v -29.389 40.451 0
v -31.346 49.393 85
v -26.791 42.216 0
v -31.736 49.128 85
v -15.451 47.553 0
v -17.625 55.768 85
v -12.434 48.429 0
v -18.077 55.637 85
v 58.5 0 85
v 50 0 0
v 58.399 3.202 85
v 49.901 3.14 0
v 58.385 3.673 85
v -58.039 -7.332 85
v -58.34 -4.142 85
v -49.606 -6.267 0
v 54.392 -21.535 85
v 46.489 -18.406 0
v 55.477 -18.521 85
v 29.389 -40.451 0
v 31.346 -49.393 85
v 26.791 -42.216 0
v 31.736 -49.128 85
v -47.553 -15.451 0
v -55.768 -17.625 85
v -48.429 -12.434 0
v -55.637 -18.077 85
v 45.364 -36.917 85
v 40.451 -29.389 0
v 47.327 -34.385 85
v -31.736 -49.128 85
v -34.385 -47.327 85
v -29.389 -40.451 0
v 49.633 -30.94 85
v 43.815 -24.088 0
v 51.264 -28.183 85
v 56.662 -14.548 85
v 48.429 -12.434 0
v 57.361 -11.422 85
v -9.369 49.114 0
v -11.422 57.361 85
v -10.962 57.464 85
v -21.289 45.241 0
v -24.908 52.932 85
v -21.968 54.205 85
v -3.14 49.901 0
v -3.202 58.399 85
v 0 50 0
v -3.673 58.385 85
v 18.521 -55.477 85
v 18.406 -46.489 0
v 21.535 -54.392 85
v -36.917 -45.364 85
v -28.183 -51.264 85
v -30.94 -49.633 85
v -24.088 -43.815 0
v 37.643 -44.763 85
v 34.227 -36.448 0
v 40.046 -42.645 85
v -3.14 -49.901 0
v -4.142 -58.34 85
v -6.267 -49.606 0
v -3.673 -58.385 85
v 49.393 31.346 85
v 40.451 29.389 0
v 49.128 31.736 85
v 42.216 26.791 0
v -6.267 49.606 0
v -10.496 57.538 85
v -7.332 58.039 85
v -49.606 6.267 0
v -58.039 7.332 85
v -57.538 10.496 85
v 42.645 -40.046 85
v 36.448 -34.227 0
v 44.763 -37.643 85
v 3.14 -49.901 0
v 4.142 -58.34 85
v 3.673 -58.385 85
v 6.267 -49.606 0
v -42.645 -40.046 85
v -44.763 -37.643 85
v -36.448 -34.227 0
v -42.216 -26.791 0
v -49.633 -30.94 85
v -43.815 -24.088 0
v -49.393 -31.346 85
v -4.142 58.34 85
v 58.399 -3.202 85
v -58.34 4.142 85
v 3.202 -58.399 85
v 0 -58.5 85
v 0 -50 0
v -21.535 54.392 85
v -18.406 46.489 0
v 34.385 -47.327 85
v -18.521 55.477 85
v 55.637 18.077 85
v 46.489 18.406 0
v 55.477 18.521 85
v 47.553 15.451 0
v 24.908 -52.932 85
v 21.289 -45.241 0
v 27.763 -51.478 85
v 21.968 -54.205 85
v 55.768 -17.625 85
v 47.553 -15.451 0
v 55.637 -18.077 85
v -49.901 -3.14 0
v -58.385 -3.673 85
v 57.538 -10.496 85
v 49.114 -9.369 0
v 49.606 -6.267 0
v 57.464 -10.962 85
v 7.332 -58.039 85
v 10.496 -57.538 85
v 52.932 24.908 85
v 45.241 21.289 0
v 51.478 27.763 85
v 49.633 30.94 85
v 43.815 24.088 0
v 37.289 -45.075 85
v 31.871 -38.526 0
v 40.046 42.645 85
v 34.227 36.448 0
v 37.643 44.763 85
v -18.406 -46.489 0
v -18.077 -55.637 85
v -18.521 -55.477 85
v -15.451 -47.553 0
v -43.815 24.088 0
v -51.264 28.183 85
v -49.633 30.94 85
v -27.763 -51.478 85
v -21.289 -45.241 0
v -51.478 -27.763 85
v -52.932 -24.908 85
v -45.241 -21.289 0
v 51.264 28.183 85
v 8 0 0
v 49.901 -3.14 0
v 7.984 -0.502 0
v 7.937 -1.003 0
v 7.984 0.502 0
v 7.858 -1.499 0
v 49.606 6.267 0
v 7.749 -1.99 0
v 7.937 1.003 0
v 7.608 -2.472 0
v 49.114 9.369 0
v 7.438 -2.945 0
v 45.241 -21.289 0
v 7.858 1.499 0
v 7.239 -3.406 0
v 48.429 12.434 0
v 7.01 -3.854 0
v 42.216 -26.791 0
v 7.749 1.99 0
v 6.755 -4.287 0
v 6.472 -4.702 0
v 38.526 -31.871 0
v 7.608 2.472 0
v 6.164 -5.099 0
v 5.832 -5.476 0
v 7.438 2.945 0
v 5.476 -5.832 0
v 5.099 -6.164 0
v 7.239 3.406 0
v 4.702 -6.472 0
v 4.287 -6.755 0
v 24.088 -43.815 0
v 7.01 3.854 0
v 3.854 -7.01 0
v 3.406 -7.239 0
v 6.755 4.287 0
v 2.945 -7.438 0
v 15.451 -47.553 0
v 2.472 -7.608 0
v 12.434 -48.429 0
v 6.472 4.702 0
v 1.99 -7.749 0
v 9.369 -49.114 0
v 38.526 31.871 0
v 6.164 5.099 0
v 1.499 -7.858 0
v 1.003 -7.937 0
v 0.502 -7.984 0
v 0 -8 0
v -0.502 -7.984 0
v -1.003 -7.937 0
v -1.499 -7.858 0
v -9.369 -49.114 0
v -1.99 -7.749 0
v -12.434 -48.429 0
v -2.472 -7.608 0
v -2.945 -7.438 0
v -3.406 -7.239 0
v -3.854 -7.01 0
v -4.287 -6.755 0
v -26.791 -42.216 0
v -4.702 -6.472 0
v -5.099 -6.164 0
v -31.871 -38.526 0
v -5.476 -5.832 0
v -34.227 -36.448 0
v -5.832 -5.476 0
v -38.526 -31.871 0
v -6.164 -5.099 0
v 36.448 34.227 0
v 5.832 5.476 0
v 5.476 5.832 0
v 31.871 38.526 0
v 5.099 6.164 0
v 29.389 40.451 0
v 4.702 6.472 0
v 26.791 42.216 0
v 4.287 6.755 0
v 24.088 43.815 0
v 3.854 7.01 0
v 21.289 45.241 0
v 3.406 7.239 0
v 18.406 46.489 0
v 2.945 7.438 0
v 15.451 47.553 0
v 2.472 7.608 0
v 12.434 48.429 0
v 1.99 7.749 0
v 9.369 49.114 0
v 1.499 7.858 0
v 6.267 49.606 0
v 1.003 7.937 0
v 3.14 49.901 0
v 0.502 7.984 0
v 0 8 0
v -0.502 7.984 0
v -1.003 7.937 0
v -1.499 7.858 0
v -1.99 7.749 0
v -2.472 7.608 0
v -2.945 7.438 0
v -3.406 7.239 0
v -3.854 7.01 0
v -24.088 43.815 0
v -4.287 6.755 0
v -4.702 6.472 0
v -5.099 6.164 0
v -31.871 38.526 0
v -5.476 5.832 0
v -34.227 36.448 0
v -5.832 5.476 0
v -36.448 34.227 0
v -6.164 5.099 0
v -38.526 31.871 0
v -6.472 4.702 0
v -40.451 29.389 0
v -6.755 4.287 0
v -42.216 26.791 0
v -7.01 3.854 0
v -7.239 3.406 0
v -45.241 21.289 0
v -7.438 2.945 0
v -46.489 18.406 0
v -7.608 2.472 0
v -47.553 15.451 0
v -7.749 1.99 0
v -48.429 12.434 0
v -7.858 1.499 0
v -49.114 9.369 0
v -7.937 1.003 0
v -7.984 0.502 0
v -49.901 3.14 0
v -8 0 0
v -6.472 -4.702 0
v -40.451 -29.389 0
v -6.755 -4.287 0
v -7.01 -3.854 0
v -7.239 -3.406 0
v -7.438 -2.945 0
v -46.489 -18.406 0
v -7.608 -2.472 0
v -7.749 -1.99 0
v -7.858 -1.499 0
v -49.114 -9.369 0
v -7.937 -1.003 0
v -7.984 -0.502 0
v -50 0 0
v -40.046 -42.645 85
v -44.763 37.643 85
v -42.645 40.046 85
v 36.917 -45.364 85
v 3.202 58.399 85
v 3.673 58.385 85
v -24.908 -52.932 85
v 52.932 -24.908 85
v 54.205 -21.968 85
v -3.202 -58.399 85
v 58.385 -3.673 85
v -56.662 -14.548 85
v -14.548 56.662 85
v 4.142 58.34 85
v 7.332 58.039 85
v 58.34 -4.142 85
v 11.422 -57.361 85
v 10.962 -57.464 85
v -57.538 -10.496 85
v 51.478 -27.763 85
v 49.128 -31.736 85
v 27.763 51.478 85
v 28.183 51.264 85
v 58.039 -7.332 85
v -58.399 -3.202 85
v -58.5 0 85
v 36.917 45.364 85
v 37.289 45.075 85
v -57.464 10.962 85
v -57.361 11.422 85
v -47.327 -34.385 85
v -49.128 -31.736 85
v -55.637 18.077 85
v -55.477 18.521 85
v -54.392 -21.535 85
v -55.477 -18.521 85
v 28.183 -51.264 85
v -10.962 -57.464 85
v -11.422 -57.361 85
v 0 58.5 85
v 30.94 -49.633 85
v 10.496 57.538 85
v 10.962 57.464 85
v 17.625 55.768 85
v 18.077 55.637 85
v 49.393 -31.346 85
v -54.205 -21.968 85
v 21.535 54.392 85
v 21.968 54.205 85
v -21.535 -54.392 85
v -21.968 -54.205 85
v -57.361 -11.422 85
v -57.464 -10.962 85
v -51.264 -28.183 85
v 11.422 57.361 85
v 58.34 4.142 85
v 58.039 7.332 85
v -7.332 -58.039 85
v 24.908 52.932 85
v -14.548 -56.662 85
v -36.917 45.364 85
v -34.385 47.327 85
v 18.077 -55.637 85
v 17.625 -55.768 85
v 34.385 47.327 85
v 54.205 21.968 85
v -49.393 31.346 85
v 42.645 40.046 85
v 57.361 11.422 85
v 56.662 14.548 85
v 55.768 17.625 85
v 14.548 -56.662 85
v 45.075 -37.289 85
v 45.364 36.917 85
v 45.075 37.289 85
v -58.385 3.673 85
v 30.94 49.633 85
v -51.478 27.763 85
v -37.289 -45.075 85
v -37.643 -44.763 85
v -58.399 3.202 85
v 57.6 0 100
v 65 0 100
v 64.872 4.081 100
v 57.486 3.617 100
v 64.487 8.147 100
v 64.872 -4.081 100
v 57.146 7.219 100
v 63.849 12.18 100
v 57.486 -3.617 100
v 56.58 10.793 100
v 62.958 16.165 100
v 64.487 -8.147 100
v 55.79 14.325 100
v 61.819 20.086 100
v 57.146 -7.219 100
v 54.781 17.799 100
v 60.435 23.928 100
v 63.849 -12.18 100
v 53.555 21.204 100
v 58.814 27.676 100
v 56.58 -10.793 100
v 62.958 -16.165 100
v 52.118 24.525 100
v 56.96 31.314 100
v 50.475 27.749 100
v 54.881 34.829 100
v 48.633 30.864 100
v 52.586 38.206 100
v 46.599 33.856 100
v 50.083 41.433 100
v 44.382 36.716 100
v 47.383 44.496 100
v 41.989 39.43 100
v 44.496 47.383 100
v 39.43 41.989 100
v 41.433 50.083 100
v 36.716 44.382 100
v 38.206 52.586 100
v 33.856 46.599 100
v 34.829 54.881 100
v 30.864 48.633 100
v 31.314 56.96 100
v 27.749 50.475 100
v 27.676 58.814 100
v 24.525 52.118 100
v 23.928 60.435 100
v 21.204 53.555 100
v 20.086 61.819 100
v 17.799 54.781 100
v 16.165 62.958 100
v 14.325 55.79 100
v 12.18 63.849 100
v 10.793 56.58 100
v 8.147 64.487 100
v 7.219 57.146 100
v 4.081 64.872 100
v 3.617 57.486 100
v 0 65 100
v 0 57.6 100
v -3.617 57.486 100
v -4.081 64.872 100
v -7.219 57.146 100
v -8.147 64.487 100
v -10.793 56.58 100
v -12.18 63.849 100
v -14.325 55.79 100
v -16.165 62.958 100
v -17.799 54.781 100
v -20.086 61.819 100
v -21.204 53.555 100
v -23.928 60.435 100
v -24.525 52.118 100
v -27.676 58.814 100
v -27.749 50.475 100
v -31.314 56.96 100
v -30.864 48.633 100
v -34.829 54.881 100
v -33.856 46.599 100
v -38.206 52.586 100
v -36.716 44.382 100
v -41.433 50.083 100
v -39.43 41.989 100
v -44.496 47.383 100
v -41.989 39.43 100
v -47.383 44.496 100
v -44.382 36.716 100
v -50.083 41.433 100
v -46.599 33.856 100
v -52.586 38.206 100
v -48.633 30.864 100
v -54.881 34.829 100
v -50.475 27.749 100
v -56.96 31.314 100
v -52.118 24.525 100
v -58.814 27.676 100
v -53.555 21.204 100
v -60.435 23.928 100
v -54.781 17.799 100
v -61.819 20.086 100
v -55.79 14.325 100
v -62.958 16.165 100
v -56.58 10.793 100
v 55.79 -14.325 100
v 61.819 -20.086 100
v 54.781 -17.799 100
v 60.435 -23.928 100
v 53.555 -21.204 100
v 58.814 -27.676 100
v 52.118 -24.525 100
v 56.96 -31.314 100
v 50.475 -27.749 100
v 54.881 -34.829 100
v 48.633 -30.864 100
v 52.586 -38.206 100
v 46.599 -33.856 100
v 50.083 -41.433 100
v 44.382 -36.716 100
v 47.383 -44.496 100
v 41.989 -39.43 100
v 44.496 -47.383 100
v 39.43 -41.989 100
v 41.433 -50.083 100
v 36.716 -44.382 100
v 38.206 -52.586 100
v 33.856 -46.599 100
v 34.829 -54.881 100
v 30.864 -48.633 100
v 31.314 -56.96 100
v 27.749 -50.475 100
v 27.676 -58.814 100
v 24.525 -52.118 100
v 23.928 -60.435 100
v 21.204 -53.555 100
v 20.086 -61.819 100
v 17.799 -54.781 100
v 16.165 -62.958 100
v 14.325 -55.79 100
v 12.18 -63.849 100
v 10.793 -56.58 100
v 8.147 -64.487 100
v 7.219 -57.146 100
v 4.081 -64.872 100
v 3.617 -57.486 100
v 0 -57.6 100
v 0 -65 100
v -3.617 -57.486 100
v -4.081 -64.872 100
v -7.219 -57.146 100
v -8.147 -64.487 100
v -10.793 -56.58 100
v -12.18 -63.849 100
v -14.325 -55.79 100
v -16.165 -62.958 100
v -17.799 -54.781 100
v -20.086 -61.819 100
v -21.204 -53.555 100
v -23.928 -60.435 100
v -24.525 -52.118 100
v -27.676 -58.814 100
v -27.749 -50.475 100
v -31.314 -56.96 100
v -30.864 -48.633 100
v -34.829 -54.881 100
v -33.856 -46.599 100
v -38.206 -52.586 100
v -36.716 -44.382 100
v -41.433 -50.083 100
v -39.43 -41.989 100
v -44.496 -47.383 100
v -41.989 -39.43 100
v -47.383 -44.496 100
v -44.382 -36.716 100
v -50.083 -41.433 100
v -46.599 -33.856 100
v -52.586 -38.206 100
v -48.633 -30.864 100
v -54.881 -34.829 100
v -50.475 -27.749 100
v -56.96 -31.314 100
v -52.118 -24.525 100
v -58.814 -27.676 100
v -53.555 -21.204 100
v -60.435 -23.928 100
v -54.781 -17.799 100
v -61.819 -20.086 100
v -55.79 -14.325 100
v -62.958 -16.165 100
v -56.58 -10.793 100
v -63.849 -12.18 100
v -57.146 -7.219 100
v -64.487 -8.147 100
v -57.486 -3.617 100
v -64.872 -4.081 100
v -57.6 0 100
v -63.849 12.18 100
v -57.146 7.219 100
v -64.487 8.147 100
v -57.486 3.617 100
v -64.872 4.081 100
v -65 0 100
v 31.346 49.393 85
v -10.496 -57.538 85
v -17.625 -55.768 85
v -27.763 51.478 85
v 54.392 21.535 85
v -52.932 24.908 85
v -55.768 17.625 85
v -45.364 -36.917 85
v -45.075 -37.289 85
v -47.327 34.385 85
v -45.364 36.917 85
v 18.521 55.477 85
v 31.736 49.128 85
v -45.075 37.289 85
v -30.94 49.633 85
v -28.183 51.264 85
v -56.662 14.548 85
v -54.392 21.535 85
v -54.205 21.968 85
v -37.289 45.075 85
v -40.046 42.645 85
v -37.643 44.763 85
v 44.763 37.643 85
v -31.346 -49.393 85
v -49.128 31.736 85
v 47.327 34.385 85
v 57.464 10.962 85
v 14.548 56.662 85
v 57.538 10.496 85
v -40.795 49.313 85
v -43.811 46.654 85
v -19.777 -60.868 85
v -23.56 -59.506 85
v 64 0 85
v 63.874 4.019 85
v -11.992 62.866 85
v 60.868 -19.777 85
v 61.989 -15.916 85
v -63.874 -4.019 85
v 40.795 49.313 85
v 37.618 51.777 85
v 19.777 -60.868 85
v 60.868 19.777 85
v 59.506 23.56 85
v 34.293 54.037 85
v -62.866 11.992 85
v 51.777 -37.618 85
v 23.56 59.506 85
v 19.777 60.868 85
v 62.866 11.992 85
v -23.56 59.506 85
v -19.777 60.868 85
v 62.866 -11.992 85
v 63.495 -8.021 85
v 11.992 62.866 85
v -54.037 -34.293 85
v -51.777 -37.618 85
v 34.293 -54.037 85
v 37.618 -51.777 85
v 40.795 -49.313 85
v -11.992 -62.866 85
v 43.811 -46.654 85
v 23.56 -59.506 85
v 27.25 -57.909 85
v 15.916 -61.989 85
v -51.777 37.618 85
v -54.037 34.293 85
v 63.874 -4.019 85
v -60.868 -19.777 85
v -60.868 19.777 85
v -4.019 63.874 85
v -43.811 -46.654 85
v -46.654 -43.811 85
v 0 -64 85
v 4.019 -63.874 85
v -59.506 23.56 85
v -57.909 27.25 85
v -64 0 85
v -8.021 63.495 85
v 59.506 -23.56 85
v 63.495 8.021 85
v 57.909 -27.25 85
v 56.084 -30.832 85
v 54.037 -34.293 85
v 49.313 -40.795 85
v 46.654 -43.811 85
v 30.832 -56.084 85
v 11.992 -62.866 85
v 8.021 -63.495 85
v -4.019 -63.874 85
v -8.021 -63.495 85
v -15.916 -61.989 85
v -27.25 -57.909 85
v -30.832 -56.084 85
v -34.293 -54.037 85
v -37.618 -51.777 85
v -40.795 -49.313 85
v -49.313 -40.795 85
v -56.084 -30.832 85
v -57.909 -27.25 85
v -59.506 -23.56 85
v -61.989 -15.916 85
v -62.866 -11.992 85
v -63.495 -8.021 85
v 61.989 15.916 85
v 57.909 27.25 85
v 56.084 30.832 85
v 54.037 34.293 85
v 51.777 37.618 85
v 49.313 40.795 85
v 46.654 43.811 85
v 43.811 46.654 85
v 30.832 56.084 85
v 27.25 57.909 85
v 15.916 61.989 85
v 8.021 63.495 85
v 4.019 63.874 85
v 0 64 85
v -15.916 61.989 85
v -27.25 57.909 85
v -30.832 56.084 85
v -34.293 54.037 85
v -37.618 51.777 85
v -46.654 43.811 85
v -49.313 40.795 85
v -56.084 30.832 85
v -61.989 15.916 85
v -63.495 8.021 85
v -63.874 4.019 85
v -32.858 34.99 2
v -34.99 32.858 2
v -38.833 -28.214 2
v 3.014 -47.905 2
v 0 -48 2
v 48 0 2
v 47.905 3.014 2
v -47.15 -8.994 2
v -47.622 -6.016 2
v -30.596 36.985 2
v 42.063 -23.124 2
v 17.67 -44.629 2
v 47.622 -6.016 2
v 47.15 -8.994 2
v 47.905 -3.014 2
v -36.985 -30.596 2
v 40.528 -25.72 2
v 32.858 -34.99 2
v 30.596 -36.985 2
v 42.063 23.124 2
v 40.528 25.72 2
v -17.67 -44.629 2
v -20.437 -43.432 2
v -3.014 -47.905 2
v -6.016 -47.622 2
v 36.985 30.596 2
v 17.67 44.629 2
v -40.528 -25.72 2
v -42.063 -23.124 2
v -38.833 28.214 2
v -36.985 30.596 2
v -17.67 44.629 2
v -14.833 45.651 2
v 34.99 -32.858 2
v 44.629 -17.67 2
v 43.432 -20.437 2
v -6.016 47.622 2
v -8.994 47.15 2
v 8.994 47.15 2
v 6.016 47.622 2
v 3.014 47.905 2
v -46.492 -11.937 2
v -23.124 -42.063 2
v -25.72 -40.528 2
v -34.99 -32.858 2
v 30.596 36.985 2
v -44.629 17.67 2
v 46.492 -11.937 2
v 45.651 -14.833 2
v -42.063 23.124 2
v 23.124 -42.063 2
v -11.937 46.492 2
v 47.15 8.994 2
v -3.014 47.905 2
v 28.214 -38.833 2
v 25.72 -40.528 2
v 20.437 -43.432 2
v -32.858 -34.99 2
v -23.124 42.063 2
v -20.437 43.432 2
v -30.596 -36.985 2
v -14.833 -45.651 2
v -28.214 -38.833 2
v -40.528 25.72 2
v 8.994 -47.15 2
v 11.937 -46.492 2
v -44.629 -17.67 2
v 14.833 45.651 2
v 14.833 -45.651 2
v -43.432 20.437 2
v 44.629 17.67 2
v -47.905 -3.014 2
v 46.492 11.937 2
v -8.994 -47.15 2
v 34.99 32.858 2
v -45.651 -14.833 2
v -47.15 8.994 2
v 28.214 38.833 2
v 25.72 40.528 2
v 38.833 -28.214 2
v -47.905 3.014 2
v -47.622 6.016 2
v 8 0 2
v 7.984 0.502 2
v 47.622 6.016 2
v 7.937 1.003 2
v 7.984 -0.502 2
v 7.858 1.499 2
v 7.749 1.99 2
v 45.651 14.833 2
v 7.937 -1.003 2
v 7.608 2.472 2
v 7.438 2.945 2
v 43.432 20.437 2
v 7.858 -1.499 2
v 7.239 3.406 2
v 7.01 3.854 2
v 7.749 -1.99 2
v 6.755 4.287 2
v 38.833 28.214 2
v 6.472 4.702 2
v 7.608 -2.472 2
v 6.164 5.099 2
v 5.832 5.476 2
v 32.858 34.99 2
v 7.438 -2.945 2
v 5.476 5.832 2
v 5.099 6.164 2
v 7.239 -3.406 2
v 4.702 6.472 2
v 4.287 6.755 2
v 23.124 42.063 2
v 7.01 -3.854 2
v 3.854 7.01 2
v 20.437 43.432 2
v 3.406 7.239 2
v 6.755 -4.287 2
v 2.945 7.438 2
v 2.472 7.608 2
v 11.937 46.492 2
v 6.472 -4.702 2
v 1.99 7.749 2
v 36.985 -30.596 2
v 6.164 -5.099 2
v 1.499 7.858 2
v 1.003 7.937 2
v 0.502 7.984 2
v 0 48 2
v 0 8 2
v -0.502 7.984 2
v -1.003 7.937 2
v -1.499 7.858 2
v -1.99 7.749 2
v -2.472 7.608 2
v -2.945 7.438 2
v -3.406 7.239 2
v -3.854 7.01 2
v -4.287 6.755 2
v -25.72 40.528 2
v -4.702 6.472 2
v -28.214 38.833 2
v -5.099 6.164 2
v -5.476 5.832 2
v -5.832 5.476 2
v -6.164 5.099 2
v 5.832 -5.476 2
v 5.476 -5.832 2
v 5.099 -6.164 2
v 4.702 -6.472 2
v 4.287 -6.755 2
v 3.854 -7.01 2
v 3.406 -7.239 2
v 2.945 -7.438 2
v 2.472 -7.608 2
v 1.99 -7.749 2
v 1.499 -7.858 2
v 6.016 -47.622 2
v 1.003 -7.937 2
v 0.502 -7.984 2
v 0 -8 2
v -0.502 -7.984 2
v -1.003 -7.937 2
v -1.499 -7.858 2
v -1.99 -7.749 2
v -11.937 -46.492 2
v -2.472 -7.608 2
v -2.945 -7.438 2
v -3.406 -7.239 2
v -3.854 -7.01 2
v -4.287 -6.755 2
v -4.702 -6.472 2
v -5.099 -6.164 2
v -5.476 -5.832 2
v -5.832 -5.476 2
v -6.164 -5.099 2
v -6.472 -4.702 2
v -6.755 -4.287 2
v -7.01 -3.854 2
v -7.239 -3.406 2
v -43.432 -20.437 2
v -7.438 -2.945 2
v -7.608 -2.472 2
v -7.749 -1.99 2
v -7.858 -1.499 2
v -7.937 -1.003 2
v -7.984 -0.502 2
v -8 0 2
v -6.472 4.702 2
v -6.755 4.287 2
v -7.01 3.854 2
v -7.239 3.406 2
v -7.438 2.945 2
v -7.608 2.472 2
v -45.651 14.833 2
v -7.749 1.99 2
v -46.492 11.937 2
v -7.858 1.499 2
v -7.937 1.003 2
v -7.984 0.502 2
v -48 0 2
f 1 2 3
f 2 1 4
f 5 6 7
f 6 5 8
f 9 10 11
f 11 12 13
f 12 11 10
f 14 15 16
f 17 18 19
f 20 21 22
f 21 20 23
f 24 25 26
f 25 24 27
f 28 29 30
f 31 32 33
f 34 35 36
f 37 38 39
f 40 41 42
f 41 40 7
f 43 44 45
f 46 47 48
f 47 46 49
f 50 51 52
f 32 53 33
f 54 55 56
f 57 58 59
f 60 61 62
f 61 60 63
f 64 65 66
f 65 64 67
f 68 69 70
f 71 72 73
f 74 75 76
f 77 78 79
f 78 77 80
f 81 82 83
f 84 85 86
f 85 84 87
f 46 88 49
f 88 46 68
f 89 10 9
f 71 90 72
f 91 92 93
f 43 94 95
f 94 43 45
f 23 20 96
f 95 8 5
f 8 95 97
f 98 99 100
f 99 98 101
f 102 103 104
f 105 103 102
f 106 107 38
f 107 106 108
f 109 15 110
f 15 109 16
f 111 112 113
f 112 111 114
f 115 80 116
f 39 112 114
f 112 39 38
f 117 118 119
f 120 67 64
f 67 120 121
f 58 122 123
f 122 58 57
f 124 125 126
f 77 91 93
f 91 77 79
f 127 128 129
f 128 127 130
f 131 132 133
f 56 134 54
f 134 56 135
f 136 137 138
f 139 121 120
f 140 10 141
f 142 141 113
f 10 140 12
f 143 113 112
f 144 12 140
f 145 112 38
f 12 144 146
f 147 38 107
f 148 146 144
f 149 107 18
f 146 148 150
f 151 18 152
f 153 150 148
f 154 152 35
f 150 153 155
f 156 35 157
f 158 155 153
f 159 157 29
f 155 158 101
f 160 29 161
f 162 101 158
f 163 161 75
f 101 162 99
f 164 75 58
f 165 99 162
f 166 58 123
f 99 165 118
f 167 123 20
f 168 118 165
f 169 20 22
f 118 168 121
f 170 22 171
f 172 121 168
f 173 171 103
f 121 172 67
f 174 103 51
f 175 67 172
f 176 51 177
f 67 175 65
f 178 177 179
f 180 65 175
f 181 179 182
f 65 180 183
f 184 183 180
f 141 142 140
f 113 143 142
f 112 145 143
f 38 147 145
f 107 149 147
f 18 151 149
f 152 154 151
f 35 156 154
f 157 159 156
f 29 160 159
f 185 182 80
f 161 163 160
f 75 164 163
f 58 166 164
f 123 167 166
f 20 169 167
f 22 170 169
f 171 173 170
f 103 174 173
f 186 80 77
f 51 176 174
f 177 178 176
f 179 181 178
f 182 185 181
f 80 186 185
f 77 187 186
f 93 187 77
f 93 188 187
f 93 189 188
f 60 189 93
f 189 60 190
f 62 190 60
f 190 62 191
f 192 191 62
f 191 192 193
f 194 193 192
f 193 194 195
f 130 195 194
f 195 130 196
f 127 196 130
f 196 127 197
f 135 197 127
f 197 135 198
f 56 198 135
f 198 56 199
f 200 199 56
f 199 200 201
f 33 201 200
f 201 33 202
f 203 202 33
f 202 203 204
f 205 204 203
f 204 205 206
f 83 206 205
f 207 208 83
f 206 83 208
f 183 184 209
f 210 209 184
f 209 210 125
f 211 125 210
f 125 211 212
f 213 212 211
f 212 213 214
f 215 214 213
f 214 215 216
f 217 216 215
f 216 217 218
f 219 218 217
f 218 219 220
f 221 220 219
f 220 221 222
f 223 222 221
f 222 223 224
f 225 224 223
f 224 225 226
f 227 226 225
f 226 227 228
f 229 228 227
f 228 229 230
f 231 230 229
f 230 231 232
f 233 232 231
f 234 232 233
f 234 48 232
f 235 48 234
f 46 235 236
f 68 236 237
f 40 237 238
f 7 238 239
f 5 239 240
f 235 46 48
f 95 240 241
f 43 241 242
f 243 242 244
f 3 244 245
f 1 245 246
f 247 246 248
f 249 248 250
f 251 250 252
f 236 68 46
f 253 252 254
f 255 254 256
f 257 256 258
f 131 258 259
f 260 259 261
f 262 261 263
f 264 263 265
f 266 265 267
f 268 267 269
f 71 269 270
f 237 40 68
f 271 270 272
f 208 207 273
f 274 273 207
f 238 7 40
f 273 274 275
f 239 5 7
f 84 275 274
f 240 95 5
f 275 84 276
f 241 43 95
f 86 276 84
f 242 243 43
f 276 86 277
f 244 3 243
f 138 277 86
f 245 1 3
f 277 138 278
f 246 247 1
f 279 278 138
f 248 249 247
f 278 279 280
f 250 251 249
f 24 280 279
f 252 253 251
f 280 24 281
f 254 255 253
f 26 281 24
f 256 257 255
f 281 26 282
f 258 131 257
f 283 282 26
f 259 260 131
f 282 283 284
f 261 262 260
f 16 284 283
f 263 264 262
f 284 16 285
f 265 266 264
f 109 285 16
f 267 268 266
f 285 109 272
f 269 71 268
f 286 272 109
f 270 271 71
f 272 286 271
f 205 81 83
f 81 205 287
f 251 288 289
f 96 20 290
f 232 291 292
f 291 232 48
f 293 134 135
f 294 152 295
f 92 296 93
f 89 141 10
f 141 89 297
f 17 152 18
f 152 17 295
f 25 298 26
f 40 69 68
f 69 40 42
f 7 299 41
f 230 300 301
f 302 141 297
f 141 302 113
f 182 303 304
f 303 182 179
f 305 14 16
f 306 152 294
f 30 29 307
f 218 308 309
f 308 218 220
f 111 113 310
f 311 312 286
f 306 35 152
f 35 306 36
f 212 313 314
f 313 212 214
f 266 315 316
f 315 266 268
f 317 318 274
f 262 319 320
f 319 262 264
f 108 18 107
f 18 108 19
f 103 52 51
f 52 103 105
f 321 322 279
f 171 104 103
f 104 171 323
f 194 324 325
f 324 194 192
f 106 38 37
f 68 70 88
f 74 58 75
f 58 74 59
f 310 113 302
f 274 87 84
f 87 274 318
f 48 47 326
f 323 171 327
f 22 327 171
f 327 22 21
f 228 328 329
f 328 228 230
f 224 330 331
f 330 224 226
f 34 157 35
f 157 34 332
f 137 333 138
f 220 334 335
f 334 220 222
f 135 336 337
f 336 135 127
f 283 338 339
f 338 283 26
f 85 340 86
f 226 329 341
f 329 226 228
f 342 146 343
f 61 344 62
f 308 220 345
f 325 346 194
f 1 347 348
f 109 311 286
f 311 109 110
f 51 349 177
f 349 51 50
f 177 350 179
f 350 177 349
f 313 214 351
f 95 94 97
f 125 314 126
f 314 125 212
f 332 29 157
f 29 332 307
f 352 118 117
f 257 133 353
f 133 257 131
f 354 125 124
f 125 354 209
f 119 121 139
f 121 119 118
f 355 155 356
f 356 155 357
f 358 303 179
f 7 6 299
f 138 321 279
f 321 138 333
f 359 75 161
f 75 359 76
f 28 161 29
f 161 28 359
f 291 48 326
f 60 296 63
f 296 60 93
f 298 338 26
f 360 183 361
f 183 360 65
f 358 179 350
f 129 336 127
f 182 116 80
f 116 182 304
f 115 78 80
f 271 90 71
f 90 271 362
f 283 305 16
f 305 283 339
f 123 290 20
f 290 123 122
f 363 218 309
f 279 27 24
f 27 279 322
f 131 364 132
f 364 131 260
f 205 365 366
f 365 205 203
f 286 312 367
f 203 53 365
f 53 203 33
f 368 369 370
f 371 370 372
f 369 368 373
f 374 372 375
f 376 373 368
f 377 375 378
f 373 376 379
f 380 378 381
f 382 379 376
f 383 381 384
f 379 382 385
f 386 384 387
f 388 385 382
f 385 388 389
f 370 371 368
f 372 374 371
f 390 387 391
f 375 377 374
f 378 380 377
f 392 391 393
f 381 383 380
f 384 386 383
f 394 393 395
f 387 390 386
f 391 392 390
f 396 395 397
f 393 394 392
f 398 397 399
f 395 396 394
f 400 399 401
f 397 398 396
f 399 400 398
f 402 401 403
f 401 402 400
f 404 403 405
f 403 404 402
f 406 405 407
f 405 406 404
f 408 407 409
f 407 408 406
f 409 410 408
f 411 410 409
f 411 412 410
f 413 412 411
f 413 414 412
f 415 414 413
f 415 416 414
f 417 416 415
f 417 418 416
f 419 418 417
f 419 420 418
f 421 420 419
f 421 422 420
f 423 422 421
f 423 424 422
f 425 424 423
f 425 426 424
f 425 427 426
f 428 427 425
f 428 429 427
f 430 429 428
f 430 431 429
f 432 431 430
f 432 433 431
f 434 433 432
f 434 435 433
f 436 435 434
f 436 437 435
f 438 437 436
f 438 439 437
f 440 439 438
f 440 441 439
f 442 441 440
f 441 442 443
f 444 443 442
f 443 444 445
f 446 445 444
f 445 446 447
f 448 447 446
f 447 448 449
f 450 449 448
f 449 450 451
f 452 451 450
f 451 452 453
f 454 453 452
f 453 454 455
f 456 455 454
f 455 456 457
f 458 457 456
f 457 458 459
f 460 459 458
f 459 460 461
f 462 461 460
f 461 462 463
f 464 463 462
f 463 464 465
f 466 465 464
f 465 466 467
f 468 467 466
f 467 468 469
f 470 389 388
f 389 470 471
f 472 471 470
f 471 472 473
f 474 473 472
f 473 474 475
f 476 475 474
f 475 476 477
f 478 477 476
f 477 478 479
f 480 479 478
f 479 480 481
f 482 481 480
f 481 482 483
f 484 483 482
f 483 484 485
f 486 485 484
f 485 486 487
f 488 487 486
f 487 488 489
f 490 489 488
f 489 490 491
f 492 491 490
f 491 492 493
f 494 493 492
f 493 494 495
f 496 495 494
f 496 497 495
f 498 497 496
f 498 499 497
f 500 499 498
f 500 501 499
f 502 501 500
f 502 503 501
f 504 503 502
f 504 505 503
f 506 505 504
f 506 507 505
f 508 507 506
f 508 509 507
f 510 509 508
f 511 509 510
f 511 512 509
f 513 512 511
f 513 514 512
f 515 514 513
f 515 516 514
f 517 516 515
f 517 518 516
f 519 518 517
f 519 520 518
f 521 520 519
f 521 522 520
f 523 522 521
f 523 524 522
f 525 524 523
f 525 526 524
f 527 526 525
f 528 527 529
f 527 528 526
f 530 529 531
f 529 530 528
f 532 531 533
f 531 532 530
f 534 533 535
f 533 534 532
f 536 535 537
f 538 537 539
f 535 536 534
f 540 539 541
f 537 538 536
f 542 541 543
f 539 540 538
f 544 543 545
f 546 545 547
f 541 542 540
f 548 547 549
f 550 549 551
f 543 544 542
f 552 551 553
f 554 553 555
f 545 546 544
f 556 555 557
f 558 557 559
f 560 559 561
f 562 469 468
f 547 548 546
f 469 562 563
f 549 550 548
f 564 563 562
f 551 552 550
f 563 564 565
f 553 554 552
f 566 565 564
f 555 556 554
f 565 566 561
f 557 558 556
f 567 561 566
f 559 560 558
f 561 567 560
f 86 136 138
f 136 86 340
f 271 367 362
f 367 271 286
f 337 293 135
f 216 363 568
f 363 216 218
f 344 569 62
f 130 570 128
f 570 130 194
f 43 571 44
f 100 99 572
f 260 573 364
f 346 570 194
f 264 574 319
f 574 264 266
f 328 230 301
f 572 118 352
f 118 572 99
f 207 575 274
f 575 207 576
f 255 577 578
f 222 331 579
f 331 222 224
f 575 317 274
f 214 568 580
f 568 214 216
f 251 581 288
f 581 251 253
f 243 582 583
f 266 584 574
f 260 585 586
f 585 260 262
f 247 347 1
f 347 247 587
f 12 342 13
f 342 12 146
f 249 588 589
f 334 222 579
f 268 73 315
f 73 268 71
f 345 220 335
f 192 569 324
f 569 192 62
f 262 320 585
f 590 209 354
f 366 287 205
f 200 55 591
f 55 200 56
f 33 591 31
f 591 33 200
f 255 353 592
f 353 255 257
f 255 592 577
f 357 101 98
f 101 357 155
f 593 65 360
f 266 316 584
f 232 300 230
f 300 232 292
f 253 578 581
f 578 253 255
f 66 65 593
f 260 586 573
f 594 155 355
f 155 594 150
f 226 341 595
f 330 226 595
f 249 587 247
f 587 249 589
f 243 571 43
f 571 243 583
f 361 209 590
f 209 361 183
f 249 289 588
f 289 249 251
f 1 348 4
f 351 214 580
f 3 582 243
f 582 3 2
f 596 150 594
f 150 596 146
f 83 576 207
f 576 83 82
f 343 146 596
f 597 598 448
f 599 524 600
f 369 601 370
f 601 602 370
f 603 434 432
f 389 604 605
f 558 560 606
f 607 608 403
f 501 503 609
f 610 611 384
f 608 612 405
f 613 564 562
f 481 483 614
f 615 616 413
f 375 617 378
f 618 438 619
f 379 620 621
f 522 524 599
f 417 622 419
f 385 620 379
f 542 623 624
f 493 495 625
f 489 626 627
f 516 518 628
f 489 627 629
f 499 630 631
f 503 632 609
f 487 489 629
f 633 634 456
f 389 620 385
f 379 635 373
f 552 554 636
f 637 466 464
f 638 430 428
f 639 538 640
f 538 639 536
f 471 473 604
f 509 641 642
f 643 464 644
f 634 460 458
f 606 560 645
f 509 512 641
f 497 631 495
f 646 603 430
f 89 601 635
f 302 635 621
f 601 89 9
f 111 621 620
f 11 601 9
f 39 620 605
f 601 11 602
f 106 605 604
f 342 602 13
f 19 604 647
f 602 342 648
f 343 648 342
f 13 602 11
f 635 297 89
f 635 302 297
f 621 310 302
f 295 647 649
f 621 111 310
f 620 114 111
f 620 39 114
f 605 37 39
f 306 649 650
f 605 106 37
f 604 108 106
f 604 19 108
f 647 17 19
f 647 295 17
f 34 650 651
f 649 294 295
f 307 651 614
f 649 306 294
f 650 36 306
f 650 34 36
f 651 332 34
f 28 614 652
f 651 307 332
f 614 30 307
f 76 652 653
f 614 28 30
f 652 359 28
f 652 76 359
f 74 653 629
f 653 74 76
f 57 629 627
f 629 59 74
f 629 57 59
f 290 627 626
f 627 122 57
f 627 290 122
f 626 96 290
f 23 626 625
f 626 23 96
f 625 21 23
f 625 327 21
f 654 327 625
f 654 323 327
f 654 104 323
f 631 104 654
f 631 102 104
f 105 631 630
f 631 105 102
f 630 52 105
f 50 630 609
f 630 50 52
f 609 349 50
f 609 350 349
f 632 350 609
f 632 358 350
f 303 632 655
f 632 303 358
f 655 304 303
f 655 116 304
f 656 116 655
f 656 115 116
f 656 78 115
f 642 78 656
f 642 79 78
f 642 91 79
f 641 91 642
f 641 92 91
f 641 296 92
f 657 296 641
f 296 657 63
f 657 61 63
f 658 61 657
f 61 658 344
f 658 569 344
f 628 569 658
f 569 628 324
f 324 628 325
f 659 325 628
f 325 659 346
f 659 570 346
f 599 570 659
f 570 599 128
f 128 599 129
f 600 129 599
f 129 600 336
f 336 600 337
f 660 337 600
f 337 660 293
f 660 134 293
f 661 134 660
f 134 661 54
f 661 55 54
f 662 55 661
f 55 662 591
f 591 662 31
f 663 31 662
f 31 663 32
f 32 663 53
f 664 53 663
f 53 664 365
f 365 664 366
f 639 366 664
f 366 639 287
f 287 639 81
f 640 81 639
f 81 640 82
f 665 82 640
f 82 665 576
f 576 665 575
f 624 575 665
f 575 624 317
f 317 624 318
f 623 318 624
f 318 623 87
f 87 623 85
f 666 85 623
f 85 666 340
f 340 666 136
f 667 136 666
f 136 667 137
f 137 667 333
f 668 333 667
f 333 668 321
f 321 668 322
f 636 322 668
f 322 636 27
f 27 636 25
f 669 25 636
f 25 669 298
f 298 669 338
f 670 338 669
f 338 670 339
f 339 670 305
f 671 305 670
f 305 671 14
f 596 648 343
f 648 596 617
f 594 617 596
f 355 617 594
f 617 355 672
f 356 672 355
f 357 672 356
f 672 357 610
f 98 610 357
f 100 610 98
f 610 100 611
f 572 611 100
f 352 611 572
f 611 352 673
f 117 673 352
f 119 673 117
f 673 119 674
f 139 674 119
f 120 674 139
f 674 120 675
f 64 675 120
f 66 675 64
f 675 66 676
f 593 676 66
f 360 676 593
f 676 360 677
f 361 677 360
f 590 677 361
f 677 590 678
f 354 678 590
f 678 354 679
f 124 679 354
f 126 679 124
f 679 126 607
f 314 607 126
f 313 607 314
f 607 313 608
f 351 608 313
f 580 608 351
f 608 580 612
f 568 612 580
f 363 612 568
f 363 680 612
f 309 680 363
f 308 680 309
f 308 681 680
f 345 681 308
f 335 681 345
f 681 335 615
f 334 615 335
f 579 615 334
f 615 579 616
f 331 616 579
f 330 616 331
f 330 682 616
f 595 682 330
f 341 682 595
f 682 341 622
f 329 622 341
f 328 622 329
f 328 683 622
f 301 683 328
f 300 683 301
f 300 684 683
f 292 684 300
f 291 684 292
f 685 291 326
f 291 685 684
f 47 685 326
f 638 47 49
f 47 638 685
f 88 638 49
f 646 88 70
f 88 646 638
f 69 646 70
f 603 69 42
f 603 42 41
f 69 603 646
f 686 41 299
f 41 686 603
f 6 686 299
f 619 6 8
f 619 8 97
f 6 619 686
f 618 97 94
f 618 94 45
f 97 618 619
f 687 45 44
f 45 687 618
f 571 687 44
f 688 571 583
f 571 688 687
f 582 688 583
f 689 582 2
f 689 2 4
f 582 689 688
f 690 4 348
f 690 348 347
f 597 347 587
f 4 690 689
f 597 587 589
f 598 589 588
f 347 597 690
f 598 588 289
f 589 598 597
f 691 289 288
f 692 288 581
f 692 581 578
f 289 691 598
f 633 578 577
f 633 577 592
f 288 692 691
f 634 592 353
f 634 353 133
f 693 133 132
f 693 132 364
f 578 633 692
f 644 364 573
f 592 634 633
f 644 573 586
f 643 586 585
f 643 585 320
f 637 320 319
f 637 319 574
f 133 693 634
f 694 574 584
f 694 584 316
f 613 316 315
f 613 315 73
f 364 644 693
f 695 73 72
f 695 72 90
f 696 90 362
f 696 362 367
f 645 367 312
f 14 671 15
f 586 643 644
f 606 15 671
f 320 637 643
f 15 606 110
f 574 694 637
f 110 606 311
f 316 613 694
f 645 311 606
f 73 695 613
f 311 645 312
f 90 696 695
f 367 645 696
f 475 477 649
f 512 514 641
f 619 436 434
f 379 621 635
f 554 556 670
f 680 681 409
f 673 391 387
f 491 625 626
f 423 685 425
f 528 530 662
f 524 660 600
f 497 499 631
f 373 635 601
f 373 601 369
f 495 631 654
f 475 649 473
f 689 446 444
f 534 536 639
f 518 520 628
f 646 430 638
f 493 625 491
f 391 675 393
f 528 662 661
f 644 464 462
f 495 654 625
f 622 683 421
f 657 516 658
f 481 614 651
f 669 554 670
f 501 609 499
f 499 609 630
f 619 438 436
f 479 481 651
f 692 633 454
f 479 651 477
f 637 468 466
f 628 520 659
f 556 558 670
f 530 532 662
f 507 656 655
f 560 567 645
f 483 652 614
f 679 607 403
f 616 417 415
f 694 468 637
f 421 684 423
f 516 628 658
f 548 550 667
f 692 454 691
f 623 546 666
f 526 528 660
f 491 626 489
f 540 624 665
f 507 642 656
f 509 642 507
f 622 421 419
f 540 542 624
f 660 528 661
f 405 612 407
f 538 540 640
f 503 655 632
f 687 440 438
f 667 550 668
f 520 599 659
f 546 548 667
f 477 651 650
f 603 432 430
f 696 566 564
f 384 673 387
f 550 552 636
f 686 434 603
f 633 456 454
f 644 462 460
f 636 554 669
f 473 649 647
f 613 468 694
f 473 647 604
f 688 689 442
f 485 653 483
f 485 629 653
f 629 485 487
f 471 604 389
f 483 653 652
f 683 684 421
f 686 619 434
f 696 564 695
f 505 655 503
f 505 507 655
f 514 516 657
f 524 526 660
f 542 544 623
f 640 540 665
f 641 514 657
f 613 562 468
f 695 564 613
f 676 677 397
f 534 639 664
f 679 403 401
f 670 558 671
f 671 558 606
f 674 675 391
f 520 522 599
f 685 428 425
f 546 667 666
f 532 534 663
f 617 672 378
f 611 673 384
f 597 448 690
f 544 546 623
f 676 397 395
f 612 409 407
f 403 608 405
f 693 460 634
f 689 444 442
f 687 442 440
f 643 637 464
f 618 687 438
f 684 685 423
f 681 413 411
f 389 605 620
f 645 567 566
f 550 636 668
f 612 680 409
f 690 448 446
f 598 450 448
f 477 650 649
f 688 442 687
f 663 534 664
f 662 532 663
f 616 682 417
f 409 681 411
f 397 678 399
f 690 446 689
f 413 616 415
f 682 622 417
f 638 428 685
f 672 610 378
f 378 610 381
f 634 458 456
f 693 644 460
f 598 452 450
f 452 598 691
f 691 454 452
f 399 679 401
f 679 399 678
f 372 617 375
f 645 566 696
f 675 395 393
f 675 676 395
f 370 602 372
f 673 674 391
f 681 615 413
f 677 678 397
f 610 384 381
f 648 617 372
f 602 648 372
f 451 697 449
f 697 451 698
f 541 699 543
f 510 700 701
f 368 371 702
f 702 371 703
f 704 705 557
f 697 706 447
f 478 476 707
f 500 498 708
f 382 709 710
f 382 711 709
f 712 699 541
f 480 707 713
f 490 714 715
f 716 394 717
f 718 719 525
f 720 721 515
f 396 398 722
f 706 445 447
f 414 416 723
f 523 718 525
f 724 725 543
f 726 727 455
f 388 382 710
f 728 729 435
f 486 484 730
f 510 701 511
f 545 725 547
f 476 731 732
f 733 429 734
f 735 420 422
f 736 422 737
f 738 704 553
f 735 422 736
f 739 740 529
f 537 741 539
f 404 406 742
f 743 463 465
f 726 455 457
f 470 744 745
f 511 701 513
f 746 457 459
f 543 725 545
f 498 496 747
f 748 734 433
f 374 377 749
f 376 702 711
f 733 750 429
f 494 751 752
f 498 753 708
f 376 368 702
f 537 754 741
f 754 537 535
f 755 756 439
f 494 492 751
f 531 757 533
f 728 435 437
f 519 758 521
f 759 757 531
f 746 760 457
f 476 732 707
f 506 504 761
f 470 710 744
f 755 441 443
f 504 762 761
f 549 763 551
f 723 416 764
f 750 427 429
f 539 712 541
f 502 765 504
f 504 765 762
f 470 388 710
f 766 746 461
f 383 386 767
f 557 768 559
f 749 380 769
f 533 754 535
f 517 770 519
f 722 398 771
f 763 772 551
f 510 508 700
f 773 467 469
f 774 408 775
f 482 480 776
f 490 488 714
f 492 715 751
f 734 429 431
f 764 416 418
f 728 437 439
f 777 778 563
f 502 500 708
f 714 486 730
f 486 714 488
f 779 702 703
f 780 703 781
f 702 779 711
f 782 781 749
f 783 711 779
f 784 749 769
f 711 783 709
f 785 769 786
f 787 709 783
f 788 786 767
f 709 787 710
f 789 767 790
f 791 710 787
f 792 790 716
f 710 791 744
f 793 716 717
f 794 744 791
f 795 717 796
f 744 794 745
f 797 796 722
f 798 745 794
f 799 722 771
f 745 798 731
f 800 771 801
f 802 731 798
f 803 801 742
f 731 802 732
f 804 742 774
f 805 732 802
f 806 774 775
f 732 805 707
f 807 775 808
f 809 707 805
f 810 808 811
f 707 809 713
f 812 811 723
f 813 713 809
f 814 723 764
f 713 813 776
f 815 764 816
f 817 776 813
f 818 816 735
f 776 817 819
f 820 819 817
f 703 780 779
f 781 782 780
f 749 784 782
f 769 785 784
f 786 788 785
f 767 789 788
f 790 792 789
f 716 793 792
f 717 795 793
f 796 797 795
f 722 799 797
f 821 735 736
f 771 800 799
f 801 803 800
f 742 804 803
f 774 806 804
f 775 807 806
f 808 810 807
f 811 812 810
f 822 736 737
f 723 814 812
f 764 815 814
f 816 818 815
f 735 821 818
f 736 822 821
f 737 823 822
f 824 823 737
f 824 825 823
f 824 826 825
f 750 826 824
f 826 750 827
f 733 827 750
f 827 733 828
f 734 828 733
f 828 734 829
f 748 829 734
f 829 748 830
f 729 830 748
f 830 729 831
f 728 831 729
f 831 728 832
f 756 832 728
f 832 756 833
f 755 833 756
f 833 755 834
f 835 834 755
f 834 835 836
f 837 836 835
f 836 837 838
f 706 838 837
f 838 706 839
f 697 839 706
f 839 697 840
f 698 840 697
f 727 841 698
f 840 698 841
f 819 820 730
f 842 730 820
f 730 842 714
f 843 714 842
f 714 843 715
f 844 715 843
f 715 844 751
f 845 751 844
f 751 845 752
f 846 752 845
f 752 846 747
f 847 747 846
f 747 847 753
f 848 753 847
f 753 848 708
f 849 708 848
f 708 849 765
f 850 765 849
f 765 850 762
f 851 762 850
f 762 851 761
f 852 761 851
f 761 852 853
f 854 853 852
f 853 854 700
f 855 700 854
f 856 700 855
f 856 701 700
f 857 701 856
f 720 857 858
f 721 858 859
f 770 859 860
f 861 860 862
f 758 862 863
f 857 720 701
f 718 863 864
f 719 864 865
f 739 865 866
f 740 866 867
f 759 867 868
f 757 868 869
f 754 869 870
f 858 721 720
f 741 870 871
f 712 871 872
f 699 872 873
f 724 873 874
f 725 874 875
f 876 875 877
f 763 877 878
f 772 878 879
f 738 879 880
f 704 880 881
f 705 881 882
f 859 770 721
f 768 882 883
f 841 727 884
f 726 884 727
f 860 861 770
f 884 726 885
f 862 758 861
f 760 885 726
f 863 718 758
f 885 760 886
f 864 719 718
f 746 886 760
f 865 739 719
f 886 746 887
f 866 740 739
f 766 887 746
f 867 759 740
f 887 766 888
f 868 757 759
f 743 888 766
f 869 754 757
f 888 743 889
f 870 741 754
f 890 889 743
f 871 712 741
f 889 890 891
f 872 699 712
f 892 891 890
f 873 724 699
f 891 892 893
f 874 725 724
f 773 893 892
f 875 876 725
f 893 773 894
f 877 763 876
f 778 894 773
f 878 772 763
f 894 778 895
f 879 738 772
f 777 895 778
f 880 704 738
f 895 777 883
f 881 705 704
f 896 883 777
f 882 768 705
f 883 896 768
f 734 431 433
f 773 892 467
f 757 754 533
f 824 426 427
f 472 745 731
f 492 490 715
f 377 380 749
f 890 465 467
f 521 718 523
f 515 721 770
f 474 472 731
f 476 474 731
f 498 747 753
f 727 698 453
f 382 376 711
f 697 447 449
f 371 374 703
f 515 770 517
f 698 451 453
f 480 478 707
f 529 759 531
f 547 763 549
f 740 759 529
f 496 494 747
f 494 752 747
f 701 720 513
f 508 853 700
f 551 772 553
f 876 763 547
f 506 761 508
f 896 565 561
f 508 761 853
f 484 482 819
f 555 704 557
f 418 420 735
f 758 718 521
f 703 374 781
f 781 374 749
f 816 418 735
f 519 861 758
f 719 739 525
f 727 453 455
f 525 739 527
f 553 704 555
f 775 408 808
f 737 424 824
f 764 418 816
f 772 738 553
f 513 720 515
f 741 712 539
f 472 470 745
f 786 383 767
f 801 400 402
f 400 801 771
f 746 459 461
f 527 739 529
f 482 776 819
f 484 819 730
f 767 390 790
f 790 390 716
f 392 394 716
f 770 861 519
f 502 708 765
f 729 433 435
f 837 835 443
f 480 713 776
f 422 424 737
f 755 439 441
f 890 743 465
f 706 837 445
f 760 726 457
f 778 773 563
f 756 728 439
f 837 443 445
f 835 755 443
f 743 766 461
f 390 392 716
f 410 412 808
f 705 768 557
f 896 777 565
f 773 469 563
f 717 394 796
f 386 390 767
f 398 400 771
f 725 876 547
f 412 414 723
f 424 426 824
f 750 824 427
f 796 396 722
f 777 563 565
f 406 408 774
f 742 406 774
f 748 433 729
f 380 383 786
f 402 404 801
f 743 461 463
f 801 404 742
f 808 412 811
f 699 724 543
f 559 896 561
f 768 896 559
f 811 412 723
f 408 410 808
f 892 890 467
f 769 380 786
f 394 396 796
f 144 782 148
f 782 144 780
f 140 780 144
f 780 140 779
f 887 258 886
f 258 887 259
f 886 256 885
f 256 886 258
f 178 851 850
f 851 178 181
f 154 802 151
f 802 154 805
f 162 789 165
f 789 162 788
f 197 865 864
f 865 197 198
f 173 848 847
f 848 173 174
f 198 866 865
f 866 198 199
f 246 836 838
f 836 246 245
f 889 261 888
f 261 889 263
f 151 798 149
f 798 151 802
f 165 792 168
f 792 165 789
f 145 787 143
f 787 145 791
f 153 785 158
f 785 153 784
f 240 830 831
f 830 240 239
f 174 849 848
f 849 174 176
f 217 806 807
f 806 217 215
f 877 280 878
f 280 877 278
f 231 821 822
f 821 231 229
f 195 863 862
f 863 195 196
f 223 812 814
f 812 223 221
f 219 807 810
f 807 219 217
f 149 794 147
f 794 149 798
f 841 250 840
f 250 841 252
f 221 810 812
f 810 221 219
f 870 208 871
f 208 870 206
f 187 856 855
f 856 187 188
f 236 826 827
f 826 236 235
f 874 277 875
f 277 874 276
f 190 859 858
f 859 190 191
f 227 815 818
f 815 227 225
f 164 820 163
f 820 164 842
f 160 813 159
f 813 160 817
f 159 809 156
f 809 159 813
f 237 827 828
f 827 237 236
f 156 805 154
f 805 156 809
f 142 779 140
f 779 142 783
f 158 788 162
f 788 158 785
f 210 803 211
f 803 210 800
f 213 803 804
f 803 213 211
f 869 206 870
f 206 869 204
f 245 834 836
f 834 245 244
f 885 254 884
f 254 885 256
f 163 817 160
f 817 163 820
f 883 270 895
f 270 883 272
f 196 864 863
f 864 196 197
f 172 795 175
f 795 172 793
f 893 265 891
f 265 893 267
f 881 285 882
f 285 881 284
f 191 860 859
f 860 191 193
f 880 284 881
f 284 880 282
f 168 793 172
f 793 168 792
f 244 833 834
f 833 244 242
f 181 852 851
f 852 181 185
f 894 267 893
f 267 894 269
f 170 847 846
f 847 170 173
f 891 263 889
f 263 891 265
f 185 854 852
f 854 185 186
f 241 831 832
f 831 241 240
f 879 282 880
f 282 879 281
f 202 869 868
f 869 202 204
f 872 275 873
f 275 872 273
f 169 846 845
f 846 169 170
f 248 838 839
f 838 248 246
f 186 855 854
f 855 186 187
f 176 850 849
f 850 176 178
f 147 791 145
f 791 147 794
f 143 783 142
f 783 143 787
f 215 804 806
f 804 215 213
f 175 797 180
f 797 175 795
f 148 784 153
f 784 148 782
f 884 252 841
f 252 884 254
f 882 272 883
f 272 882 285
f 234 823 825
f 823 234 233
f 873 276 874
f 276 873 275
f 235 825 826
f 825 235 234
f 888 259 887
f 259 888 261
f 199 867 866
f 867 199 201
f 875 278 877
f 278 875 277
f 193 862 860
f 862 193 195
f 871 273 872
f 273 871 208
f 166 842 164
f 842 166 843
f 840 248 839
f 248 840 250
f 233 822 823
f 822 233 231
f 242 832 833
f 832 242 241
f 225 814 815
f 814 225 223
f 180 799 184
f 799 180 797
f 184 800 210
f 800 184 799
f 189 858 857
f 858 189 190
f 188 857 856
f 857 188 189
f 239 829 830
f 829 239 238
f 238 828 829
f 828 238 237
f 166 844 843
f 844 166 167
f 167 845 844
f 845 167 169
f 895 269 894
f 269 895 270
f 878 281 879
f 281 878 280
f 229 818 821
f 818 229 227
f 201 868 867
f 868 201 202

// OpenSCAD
// variables
size = 100; // [50:S,100:M,150:L]
wallthickness = 2; // [1:S,2:M,3:L]
hole = 1; // [1:Yes,0;No]
resolution = 100; // [100:rough,150:middle,200:fine]


// model
difference(){
	difference(){
		union(){
			translate([0,0,0])cylinder(h = size, r1 = size/2, r2 = size*1.2/2, $fn = resolution);
			translate([0,0,size*0.85])cylinder(h = size*0.15, r1 = size*1.28/2, r2 = size*1.3/2, $fn = resolution);
		}
		translate([0,0,wallthickness])cylinder(h = size-wallthickness, r1 = (size-2*wallthickness)/2, r2 = (size-2*wallthickness)*1.2/2, $fn = resolution);
	}
	if(hole==1){
		cylinder(h = wallthickness, r1 = size*0.08, r2 = size*0.08, $fn = resolution);
	}
}
